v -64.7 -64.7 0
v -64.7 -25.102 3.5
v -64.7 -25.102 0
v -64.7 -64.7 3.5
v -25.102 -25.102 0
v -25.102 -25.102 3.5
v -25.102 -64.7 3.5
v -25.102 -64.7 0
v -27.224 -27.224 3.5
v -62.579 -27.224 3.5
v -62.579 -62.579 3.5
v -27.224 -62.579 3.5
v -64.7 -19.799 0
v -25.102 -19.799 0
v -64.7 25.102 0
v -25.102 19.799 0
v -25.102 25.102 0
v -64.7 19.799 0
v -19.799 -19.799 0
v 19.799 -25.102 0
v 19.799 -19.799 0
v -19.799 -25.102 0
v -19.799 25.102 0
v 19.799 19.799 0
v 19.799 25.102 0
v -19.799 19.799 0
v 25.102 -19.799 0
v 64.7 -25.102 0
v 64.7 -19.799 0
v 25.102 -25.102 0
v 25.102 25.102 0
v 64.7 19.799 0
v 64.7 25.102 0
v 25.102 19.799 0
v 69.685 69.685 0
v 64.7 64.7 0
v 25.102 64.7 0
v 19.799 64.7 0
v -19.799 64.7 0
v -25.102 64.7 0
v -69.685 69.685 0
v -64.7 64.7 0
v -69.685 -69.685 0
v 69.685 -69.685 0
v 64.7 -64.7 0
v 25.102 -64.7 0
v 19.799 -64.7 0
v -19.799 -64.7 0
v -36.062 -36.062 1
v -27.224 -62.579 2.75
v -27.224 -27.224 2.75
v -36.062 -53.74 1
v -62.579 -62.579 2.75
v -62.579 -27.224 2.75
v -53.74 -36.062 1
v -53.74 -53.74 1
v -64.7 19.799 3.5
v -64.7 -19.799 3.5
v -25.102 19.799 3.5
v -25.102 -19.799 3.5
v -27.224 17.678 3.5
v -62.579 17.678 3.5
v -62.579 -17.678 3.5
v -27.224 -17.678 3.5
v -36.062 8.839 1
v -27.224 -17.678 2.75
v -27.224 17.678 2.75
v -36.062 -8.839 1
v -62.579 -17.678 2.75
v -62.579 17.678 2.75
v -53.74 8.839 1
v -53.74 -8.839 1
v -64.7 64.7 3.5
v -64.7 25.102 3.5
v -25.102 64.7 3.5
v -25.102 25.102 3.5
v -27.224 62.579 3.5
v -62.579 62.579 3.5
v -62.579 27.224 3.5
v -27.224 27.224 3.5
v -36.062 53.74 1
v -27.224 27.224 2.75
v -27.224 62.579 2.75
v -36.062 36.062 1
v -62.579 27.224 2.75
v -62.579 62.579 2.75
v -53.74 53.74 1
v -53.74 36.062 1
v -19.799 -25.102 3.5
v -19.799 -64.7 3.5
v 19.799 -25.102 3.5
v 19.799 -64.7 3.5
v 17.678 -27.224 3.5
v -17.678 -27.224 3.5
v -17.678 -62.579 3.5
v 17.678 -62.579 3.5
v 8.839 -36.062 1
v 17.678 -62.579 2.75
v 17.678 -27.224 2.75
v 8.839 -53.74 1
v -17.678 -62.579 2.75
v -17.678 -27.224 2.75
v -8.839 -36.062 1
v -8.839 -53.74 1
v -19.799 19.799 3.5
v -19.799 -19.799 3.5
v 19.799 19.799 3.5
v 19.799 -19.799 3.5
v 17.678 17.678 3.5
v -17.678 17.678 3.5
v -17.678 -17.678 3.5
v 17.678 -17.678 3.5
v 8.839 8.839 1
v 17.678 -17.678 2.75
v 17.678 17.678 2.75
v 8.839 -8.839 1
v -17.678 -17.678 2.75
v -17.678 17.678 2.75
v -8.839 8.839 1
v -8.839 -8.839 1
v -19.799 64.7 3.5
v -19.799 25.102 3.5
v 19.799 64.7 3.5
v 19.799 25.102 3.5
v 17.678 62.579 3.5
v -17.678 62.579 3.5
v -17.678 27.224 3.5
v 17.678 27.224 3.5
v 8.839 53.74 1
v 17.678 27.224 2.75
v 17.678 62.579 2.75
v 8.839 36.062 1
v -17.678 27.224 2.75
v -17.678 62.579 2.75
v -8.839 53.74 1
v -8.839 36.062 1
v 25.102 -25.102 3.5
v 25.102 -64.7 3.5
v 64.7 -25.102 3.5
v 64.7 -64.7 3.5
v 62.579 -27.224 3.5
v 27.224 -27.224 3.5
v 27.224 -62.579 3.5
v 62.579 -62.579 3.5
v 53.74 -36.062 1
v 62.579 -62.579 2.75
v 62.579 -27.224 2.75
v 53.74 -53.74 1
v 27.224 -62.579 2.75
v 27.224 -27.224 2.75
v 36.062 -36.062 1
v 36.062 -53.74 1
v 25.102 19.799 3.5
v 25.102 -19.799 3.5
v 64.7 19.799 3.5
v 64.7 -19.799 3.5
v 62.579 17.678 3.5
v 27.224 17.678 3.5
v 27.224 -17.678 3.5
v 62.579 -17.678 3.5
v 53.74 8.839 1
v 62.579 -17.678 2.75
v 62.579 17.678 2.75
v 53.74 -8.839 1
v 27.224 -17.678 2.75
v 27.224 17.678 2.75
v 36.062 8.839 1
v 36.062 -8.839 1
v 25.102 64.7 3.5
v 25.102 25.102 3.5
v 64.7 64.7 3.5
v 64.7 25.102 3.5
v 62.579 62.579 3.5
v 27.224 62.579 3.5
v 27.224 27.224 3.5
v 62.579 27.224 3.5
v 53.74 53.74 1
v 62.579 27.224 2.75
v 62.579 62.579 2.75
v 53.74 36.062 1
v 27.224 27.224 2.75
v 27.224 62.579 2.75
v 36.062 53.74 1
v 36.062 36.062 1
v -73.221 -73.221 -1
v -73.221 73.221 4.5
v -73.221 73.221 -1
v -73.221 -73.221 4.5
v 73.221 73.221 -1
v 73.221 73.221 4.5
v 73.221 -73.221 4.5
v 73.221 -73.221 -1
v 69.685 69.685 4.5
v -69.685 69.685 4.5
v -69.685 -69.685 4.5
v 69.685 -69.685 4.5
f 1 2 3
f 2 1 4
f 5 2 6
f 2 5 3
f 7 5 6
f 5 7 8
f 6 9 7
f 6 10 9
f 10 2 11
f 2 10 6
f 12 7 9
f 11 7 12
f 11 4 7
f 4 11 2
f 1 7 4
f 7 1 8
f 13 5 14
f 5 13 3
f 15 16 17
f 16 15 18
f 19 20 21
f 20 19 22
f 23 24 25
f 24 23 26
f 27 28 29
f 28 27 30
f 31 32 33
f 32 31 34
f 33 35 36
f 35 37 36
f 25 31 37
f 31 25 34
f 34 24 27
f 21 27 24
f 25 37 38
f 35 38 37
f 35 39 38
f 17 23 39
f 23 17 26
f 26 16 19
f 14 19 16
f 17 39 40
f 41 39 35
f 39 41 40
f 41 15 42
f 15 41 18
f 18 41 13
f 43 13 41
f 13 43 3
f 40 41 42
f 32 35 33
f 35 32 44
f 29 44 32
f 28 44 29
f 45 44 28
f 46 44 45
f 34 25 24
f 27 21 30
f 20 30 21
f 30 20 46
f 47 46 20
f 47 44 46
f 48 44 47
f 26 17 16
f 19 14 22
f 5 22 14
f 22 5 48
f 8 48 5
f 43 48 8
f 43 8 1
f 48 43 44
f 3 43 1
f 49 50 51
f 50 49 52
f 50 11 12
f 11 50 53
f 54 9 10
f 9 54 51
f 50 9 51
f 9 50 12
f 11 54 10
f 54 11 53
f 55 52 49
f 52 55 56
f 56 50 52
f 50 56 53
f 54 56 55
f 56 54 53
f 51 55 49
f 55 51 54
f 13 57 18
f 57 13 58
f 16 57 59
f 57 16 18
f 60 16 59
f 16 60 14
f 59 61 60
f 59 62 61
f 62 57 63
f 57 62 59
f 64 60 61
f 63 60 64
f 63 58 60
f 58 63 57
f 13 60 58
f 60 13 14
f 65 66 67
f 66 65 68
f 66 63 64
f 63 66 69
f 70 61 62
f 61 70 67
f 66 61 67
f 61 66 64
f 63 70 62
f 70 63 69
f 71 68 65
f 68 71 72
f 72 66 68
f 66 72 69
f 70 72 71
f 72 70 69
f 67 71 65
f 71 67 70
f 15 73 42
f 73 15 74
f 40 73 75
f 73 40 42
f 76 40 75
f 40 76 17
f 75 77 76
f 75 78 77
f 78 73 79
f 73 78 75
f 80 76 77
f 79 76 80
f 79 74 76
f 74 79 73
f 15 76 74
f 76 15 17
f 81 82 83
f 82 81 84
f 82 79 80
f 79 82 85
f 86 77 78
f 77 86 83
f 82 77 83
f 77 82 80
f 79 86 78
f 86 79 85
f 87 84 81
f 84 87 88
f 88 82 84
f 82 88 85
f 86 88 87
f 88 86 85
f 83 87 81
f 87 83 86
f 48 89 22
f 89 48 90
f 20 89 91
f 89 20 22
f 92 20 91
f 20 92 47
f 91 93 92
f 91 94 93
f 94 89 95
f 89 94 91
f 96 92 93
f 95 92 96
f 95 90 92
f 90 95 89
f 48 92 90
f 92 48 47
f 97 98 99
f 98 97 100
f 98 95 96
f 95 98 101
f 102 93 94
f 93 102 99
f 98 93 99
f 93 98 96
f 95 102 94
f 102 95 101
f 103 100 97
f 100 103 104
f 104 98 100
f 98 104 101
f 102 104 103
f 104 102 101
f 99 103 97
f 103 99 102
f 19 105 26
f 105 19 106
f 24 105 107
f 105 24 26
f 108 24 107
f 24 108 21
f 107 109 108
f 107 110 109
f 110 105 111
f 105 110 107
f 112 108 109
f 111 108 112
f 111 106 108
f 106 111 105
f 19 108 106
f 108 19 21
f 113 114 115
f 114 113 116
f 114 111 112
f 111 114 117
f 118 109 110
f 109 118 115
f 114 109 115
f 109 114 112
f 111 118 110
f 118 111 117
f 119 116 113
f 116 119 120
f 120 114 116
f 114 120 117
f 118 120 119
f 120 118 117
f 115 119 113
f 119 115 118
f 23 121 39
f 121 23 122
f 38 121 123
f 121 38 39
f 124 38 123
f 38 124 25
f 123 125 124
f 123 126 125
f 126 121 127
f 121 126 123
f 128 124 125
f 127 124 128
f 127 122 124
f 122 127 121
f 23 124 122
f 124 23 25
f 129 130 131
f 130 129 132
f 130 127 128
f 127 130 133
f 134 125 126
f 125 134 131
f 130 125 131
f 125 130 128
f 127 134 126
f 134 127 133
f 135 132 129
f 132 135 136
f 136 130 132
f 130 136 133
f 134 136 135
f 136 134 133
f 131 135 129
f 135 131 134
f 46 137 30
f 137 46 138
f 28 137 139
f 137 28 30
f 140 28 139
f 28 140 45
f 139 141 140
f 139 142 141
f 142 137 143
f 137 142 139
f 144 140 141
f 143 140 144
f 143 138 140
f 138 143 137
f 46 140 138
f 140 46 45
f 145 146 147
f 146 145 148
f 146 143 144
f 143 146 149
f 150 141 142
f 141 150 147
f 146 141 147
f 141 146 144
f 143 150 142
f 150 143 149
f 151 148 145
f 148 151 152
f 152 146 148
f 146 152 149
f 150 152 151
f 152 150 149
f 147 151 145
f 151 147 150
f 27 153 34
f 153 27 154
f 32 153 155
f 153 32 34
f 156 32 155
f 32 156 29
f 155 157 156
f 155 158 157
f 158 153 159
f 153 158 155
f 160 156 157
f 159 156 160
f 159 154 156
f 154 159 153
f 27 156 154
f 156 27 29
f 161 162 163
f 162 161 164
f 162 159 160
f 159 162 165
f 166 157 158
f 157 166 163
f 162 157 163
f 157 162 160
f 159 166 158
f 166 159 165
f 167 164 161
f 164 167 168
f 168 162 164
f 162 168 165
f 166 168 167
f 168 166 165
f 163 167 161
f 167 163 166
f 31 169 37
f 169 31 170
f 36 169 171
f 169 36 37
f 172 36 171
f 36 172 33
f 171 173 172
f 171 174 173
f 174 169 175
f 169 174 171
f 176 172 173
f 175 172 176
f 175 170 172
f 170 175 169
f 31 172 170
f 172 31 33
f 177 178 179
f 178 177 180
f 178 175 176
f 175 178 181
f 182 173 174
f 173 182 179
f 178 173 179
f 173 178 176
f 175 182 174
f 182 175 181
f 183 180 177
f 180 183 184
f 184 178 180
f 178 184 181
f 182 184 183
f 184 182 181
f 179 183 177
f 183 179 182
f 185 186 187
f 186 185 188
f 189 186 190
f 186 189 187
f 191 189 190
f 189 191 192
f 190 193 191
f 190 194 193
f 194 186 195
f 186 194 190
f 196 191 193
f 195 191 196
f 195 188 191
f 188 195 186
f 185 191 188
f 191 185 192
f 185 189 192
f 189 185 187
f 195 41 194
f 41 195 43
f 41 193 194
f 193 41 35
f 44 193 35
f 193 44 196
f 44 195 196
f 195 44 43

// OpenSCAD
altura = 5.5;
R = 25;
c = 28;

H1 = altura*0.5;
H2 = altura;
n=4;

module base()
{
rotate(45)cylinder(h=(H2+5), r=(((1.25*R)*3)+4.8), $fn=n);
}

module base2()
{
rotate(45)translate([0,0,-1])cylinder(h=H2, r=(((1.25*R)*3)+9.8), $fn=n);
}

module celula()
{
cylinder(h=H2-2, r=c, $fn=n);
}

module bloco(){
	hull(){
			cylinder(h=H1, r=R, $fn=n);
			cylinder(h=H2-1, r=R/2, $fn=n);
		
	}
}


k=1.27*sqrt(2);

for (i=[-1,0,1]){
  for (j=[-1,0,1]){
    translate([(k*i*R), (k*R*j)]){
		
		
		difference()
		{
			rotate(45)color("red")celula();
			rotate([180,0,45])translate([0,0,-(H2)])color("grey")bloco();
			
		}
		

  	} 
  }
}



difference()
{

	color("blue")base2();	
	color("green")base();		
		
		
}
